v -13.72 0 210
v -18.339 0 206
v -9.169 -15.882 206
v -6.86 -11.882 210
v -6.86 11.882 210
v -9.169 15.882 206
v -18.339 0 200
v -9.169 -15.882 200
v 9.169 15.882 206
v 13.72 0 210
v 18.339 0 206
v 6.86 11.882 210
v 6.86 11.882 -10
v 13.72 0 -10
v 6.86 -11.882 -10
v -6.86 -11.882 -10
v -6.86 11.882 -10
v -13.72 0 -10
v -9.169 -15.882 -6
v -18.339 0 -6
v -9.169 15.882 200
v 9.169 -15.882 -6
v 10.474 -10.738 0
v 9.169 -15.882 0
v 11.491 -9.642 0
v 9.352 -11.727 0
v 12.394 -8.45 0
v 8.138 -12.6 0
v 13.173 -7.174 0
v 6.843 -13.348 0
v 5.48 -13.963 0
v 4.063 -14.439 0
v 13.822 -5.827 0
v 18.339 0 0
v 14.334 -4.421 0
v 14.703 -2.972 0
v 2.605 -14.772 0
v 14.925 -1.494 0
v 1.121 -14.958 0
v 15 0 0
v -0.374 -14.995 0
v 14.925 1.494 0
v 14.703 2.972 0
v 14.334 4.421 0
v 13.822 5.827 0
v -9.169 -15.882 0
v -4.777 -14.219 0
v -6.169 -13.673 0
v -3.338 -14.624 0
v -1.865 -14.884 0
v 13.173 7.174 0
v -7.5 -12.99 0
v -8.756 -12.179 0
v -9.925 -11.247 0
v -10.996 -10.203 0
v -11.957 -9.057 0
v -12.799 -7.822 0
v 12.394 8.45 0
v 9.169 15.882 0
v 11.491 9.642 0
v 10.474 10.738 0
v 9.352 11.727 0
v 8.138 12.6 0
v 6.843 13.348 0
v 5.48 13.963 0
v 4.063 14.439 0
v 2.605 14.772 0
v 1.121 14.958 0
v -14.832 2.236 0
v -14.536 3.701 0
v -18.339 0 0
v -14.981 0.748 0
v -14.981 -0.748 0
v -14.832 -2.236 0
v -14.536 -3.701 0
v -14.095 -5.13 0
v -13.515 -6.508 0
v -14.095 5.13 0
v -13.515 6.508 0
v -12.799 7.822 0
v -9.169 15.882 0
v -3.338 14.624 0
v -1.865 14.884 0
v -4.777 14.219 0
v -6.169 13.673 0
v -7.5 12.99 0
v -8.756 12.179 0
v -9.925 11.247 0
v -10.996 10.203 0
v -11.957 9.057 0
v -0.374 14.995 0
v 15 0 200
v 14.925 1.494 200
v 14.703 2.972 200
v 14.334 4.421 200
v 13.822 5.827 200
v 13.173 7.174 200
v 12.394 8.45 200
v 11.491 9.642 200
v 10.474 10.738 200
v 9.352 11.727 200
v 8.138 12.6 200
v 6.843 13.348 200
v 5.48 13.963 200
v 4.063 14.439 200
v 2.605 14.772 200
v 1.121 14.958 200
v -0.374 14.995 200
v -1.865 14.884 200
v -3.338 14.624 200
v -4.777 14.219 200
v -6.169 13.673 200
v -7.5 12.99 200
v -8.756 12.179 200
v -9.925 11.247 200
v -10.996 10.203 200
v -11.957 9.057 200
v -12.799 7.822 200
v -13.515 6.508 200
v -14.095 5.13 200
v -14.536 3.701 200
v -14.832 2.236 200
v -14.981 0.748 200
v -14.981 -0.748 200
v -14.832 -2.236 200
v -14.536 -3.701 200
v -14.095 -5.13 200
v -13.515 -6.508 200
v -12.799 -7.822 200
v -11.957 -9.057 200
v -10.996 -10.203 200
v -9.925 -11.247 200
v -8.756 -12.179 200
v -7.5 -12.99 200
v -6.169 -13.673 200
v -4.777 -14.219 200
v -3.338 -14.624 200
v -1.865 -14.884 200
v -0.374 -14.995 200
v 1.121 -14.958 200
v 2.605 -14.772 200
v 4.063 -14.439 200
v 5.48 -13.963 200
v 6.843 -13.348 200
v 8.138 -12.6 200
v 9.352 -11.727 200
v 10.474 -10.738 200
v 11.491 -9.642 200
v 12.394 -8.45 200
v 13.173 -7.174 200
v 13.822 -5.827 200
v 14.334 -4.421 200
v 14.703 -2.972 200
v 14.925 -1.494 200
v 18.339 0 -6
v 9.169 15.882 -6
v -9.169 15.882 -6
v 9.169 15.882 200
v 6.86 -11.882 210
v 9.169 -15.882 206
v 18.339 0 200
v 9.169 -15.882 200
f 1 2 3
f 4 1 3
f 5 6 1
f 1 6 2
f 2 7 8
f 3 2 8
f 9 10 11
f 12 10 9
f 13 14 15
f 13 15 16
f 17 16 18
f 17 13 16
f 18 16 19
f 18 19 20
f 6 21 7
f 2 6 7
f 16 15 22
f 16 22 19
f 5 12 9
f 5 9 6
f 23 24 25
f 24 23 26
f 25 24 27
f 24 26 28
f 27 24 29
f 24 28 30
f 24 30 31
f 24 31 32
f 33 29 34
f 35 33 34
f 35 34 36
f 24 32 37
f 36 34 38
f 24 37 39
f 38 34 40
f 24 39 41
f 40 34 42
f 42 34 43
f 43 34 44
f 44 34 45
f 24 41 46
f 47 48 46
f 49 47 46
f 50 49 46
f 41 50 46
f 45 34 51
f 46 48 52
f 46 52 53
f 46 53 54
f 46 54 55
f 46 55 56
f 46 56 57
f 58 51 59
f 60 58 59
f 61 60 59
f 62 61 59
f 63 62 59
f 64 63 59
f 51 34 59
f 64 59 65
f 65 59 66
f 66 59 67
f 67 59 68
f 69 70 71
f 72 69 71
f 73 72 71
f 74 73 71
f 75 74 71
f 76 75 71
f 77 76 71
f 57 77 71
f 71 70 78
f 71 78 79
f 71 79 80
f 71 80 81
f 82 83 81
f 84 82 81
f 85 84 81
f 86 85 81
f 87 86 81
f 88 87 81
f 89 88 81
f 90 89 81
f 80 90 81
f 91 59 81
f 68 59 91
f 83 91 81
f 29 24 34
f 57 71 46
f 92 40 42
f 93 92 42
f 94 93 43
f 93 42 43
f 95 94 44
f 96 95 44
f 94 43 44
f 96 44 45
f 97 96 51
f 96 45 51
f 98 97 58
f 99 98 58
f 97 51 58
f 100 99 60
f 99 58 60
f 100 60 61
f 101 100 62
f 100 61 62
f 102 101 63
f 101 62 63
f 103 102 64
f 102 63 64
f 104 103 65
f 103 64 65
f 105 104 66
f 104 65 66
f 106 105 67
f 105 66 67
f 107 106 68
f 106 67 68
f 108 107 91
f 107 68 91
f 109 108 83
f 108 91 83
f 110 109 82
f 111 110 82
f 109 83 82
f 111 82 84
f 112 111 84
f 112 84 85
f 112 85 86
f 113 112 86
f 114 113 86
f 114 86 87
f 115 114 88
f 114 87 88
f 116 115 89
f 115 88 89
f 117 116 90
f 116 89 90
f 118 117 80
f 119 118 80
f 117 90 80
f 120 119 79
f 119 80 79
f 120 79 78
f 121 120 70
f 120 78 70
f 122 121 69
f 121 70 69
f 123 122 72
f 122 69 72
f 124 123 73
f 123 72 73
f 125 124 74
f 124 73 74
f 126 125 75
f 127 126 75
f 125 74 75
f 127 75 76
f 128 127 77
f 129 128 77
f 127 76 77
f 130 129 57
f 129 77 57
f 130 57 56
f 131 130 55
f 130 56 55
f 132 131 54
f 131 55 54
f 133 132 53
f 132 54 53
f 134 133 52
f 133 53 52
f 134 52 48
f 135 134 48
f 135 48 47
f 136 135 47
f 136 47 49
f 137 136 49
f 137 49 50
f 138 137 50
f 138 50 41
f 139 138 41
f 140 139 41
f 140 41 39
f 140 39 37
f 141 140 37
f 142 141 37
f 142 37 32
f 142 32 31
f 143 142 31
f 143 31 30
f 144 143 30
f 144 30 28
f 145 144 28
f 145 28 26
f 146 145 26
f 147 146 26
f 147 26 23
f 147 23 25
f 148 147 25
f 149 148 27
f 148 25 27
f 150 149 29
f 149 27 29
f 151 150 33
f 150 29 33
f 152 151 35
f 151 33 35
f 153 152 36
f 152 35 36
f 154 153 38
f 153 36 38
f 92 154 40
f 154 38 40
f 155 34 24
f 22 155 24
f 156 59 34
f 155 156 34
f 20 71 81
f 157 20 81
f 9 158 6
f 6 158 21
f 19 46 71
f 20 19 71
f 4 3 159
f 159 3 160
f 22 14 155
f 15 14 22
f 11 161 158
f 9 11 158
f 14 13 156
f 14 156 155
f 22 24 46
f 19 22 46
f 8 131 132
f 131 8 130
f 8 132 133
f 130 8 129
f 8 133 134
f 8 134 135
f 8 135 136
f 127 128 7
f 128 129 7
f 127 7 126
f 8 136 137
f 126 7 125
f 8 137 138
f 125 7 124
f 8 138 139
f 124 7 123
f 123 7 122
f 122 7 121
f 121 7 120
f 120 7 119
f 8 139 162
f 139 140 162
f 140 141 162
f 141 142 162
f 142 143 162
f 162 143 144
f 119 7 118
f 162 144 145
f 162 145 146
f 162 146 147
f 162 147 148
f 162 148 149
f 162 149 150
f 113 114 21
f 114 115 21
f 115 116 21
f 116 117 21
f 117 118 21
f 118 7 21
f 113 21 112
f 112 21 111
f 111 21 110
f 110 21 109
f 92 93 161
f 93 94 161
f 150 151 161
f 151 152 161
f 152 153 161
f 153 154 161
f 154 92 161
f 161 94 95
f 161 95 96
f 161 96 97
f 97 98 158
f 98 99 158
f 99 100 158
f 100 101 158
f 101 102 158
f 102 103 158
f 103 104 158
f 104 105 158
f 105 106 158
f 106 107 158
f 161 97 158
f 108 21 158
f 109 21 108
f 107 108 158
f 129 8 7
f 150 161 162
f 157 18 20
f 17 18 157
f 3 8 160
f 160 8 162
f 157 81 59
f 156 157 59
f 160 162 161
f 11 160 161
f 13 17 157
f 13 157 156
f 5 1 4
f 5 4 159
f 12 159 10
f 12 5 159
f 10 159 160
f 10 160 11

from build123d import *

# Parameters (mm, degrees)
SKETCH1_R           = 15
BOSS_EXTRUDE1_DEPTH = 200
BOSS_EXTRUDE2_DEPTH = 10
BOSS_EXTRUDE3_DEPTH = 10
CHAMFER1_SIZE       = 4


with BuildPart() as part:
    # Sketch1 → Boss-Extrude1 (new body)
    with BuildSketch(Plane.XY):
        Circle(SKETCH1_R)
    extrude(amount=BOSS_EXTRUDE1_DEPTH)

    # Sketch3 → Boss-Extrude2 (add)
    with BuildSketch(Plane(origin=(0, 0, 0), x_dir=(-1, 0, 0), z_dir=(0, 0, -1))):
        Polygon((18.338660343, 0), (9.169330171, 15.881745728), (-9.169330171, 15.881745728), (-18.338660343, 0), (-9.169330171, -15.881745728), (9.169330171, -15.881745728), align=None)
    extrude(amount=BOSS_EXTRUDE2_DEPTH)

    # Sketch2 → Boss-Extrude3 (add)
    with BuildSketch(Plane.XY.offset(200)):
        Polygon((18.338660343, 0), (9.169330171, 15.881745728), (-9.169330171, 15.881745728), (-18.338660343, 0), (-9.169330171, -15.881745728), (9.169330171, -15.881745728), align=None)
    extrude(amount=BOSS_EXTRUDE3_DEPTH)

    # Chamfer1
    chamfer1_edges = [part.edges().sort_by_distance(p)[0] for p in [
        (13.753995257, -7.940872864, 210),
        (13.753995257, 7.940872864, 210),
        (0, 15.881745728, 210),
        (-13.753995257, 7.940872864, 210),
        (-13.753995257, -7.940872864, 210),
        (0, -15.881745728, 210),
        (-13.753995257, -7.940872864, -10),
        (-13.753995257, 7.940872864, -10),
        (0, 15.881745728, -10),
        (13.753995257, 7.940872864, -10),
        (13.753995257, -7.940872864, -10),
        (0, -15.881745728, -10),
    ]]
    chamfer(chamfer1_edges, length=CHAMFER1_SIZE)


solid = part.part
